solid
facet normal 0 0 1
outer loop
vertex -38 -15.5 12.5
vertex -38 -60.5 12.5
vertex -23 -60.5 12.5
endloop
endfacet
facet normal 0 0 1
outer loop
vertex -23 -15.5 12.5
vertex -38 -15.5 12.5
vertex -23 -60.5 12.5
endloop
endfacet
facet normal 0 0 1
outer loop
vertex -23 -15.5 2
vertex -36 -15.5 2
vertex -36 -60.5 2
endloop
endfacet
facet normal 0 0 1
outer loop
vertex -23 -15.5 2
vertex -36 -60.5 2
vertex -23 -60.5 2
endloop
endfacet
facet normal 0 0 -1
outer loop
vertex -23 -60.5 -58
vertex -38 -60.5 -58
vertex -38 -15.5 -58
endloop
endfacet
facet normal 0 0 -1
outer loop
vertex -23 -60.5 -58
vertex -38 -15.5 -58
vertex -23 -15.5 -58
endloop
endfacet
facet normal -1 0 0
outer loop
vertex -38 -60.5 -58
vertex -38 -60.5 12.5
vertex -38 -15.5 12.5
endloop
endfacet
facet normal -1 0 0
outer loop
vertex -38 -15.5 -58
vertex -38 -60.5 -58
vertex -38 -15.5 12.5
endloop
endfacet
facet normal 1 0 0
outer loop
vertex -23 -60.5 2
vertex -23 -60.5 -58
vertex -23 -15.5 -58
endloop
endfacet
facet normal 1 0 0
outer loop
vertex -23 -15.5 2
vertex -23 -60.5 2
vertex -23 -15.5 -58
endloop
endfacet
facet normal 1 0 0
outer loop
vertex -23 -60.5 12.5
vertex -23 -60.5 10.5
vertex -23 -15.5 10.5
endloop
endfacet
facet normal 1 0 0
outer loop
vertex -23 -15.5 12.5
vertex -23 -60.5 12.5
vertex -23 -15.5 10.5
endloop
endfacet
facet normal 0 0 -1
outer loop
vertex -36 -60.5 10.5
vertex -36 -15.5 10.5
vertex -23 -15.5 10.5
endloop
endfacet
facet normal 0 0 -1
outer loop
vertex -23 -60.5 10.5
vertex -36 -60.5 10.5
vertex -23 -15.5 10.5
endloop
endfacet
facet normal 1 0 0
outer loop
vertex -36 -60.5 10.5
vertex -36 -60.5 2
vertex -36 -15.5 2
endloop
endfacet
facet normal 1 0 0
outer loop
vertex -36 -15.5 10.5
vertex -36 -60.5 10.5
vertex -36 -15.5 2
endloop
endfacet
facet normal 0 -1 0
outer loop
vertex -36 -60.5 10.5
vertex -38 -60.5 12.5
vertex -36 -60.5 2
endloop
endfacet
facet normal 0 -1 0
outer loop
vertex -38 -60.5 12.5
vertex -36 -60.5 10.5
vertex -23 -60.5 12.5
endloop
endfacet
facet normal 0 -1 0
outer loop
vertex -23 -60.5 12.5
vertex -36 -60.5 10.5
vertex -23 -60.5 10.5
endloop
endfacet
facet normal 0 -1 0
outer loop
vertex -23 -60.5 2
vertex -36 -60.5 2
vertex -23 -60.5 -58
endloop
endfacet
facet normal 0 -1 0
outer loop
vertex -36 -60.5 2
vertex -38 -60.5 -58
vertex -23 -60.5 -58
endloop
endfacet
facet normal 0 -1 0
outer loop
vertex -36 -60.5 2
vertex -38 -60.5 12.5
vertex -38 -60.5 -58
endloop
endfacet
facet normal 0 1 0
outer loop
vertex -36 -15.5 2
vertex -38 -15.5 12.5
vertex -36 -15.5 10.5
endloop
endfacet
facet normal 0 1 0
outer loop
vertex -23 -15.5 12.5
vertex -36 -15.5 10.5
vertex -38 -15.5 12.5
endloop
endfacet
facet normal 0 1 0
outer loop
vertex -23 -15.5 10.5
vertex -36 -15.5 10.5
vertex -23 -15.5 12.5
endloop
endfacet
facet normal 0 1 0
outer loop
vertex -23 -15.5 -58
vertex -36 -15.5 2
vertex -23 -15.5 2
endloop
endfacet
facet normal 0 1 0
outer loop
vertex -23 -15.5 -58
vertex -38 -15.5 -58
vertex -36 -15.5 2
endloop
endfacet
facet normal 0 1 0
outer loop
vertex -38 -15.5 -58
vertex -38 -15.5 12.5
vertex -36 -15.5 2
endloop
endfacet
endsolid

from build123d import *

# Parameters (mm, degrees)
SKETCH028_W  = 13
SKETCH028_H  = 45
PAD026_DEPTH = 8.5
SKETCH030_W  = 15
SKETCH030_H  = 45
PAD028_DEPTH = 70.5


with BuildPart() as body029:
    # Sketch028 → Pad026 (new body)
    with BuildSketch(Plane.XY):
        with Locations((-28.5, -16.5)):
            Rectangle(SKETCH028_W, SKETCH028_H)
    extrude(amount=PAD026_DEPTH)


with BuildPart() as body029_1:
    # Body029 placement: moved
    add(body029.part.moved(Location((-1, -21.5, 2))))


with BuildPart() as cut030:
    # Sketch030 → Pad028 (new body)
    with BuildSketch(Plane.XY):
        with Locations((-27.5, -16.5)):
            Rectangle(SKETCH030_W, SKETCH030_H)
    extrude(amount=PAD028_DEPTH)


with BuildPart() as cut030_1:
    # Body031 placement: moved
    add(cut030.part.moved(Location((-3, -21.5, -58))))

    # Cut030: cut Body029
    add(body029_1.part, mode=Mode.SUBTRACT)


solid = cut030_1.part
